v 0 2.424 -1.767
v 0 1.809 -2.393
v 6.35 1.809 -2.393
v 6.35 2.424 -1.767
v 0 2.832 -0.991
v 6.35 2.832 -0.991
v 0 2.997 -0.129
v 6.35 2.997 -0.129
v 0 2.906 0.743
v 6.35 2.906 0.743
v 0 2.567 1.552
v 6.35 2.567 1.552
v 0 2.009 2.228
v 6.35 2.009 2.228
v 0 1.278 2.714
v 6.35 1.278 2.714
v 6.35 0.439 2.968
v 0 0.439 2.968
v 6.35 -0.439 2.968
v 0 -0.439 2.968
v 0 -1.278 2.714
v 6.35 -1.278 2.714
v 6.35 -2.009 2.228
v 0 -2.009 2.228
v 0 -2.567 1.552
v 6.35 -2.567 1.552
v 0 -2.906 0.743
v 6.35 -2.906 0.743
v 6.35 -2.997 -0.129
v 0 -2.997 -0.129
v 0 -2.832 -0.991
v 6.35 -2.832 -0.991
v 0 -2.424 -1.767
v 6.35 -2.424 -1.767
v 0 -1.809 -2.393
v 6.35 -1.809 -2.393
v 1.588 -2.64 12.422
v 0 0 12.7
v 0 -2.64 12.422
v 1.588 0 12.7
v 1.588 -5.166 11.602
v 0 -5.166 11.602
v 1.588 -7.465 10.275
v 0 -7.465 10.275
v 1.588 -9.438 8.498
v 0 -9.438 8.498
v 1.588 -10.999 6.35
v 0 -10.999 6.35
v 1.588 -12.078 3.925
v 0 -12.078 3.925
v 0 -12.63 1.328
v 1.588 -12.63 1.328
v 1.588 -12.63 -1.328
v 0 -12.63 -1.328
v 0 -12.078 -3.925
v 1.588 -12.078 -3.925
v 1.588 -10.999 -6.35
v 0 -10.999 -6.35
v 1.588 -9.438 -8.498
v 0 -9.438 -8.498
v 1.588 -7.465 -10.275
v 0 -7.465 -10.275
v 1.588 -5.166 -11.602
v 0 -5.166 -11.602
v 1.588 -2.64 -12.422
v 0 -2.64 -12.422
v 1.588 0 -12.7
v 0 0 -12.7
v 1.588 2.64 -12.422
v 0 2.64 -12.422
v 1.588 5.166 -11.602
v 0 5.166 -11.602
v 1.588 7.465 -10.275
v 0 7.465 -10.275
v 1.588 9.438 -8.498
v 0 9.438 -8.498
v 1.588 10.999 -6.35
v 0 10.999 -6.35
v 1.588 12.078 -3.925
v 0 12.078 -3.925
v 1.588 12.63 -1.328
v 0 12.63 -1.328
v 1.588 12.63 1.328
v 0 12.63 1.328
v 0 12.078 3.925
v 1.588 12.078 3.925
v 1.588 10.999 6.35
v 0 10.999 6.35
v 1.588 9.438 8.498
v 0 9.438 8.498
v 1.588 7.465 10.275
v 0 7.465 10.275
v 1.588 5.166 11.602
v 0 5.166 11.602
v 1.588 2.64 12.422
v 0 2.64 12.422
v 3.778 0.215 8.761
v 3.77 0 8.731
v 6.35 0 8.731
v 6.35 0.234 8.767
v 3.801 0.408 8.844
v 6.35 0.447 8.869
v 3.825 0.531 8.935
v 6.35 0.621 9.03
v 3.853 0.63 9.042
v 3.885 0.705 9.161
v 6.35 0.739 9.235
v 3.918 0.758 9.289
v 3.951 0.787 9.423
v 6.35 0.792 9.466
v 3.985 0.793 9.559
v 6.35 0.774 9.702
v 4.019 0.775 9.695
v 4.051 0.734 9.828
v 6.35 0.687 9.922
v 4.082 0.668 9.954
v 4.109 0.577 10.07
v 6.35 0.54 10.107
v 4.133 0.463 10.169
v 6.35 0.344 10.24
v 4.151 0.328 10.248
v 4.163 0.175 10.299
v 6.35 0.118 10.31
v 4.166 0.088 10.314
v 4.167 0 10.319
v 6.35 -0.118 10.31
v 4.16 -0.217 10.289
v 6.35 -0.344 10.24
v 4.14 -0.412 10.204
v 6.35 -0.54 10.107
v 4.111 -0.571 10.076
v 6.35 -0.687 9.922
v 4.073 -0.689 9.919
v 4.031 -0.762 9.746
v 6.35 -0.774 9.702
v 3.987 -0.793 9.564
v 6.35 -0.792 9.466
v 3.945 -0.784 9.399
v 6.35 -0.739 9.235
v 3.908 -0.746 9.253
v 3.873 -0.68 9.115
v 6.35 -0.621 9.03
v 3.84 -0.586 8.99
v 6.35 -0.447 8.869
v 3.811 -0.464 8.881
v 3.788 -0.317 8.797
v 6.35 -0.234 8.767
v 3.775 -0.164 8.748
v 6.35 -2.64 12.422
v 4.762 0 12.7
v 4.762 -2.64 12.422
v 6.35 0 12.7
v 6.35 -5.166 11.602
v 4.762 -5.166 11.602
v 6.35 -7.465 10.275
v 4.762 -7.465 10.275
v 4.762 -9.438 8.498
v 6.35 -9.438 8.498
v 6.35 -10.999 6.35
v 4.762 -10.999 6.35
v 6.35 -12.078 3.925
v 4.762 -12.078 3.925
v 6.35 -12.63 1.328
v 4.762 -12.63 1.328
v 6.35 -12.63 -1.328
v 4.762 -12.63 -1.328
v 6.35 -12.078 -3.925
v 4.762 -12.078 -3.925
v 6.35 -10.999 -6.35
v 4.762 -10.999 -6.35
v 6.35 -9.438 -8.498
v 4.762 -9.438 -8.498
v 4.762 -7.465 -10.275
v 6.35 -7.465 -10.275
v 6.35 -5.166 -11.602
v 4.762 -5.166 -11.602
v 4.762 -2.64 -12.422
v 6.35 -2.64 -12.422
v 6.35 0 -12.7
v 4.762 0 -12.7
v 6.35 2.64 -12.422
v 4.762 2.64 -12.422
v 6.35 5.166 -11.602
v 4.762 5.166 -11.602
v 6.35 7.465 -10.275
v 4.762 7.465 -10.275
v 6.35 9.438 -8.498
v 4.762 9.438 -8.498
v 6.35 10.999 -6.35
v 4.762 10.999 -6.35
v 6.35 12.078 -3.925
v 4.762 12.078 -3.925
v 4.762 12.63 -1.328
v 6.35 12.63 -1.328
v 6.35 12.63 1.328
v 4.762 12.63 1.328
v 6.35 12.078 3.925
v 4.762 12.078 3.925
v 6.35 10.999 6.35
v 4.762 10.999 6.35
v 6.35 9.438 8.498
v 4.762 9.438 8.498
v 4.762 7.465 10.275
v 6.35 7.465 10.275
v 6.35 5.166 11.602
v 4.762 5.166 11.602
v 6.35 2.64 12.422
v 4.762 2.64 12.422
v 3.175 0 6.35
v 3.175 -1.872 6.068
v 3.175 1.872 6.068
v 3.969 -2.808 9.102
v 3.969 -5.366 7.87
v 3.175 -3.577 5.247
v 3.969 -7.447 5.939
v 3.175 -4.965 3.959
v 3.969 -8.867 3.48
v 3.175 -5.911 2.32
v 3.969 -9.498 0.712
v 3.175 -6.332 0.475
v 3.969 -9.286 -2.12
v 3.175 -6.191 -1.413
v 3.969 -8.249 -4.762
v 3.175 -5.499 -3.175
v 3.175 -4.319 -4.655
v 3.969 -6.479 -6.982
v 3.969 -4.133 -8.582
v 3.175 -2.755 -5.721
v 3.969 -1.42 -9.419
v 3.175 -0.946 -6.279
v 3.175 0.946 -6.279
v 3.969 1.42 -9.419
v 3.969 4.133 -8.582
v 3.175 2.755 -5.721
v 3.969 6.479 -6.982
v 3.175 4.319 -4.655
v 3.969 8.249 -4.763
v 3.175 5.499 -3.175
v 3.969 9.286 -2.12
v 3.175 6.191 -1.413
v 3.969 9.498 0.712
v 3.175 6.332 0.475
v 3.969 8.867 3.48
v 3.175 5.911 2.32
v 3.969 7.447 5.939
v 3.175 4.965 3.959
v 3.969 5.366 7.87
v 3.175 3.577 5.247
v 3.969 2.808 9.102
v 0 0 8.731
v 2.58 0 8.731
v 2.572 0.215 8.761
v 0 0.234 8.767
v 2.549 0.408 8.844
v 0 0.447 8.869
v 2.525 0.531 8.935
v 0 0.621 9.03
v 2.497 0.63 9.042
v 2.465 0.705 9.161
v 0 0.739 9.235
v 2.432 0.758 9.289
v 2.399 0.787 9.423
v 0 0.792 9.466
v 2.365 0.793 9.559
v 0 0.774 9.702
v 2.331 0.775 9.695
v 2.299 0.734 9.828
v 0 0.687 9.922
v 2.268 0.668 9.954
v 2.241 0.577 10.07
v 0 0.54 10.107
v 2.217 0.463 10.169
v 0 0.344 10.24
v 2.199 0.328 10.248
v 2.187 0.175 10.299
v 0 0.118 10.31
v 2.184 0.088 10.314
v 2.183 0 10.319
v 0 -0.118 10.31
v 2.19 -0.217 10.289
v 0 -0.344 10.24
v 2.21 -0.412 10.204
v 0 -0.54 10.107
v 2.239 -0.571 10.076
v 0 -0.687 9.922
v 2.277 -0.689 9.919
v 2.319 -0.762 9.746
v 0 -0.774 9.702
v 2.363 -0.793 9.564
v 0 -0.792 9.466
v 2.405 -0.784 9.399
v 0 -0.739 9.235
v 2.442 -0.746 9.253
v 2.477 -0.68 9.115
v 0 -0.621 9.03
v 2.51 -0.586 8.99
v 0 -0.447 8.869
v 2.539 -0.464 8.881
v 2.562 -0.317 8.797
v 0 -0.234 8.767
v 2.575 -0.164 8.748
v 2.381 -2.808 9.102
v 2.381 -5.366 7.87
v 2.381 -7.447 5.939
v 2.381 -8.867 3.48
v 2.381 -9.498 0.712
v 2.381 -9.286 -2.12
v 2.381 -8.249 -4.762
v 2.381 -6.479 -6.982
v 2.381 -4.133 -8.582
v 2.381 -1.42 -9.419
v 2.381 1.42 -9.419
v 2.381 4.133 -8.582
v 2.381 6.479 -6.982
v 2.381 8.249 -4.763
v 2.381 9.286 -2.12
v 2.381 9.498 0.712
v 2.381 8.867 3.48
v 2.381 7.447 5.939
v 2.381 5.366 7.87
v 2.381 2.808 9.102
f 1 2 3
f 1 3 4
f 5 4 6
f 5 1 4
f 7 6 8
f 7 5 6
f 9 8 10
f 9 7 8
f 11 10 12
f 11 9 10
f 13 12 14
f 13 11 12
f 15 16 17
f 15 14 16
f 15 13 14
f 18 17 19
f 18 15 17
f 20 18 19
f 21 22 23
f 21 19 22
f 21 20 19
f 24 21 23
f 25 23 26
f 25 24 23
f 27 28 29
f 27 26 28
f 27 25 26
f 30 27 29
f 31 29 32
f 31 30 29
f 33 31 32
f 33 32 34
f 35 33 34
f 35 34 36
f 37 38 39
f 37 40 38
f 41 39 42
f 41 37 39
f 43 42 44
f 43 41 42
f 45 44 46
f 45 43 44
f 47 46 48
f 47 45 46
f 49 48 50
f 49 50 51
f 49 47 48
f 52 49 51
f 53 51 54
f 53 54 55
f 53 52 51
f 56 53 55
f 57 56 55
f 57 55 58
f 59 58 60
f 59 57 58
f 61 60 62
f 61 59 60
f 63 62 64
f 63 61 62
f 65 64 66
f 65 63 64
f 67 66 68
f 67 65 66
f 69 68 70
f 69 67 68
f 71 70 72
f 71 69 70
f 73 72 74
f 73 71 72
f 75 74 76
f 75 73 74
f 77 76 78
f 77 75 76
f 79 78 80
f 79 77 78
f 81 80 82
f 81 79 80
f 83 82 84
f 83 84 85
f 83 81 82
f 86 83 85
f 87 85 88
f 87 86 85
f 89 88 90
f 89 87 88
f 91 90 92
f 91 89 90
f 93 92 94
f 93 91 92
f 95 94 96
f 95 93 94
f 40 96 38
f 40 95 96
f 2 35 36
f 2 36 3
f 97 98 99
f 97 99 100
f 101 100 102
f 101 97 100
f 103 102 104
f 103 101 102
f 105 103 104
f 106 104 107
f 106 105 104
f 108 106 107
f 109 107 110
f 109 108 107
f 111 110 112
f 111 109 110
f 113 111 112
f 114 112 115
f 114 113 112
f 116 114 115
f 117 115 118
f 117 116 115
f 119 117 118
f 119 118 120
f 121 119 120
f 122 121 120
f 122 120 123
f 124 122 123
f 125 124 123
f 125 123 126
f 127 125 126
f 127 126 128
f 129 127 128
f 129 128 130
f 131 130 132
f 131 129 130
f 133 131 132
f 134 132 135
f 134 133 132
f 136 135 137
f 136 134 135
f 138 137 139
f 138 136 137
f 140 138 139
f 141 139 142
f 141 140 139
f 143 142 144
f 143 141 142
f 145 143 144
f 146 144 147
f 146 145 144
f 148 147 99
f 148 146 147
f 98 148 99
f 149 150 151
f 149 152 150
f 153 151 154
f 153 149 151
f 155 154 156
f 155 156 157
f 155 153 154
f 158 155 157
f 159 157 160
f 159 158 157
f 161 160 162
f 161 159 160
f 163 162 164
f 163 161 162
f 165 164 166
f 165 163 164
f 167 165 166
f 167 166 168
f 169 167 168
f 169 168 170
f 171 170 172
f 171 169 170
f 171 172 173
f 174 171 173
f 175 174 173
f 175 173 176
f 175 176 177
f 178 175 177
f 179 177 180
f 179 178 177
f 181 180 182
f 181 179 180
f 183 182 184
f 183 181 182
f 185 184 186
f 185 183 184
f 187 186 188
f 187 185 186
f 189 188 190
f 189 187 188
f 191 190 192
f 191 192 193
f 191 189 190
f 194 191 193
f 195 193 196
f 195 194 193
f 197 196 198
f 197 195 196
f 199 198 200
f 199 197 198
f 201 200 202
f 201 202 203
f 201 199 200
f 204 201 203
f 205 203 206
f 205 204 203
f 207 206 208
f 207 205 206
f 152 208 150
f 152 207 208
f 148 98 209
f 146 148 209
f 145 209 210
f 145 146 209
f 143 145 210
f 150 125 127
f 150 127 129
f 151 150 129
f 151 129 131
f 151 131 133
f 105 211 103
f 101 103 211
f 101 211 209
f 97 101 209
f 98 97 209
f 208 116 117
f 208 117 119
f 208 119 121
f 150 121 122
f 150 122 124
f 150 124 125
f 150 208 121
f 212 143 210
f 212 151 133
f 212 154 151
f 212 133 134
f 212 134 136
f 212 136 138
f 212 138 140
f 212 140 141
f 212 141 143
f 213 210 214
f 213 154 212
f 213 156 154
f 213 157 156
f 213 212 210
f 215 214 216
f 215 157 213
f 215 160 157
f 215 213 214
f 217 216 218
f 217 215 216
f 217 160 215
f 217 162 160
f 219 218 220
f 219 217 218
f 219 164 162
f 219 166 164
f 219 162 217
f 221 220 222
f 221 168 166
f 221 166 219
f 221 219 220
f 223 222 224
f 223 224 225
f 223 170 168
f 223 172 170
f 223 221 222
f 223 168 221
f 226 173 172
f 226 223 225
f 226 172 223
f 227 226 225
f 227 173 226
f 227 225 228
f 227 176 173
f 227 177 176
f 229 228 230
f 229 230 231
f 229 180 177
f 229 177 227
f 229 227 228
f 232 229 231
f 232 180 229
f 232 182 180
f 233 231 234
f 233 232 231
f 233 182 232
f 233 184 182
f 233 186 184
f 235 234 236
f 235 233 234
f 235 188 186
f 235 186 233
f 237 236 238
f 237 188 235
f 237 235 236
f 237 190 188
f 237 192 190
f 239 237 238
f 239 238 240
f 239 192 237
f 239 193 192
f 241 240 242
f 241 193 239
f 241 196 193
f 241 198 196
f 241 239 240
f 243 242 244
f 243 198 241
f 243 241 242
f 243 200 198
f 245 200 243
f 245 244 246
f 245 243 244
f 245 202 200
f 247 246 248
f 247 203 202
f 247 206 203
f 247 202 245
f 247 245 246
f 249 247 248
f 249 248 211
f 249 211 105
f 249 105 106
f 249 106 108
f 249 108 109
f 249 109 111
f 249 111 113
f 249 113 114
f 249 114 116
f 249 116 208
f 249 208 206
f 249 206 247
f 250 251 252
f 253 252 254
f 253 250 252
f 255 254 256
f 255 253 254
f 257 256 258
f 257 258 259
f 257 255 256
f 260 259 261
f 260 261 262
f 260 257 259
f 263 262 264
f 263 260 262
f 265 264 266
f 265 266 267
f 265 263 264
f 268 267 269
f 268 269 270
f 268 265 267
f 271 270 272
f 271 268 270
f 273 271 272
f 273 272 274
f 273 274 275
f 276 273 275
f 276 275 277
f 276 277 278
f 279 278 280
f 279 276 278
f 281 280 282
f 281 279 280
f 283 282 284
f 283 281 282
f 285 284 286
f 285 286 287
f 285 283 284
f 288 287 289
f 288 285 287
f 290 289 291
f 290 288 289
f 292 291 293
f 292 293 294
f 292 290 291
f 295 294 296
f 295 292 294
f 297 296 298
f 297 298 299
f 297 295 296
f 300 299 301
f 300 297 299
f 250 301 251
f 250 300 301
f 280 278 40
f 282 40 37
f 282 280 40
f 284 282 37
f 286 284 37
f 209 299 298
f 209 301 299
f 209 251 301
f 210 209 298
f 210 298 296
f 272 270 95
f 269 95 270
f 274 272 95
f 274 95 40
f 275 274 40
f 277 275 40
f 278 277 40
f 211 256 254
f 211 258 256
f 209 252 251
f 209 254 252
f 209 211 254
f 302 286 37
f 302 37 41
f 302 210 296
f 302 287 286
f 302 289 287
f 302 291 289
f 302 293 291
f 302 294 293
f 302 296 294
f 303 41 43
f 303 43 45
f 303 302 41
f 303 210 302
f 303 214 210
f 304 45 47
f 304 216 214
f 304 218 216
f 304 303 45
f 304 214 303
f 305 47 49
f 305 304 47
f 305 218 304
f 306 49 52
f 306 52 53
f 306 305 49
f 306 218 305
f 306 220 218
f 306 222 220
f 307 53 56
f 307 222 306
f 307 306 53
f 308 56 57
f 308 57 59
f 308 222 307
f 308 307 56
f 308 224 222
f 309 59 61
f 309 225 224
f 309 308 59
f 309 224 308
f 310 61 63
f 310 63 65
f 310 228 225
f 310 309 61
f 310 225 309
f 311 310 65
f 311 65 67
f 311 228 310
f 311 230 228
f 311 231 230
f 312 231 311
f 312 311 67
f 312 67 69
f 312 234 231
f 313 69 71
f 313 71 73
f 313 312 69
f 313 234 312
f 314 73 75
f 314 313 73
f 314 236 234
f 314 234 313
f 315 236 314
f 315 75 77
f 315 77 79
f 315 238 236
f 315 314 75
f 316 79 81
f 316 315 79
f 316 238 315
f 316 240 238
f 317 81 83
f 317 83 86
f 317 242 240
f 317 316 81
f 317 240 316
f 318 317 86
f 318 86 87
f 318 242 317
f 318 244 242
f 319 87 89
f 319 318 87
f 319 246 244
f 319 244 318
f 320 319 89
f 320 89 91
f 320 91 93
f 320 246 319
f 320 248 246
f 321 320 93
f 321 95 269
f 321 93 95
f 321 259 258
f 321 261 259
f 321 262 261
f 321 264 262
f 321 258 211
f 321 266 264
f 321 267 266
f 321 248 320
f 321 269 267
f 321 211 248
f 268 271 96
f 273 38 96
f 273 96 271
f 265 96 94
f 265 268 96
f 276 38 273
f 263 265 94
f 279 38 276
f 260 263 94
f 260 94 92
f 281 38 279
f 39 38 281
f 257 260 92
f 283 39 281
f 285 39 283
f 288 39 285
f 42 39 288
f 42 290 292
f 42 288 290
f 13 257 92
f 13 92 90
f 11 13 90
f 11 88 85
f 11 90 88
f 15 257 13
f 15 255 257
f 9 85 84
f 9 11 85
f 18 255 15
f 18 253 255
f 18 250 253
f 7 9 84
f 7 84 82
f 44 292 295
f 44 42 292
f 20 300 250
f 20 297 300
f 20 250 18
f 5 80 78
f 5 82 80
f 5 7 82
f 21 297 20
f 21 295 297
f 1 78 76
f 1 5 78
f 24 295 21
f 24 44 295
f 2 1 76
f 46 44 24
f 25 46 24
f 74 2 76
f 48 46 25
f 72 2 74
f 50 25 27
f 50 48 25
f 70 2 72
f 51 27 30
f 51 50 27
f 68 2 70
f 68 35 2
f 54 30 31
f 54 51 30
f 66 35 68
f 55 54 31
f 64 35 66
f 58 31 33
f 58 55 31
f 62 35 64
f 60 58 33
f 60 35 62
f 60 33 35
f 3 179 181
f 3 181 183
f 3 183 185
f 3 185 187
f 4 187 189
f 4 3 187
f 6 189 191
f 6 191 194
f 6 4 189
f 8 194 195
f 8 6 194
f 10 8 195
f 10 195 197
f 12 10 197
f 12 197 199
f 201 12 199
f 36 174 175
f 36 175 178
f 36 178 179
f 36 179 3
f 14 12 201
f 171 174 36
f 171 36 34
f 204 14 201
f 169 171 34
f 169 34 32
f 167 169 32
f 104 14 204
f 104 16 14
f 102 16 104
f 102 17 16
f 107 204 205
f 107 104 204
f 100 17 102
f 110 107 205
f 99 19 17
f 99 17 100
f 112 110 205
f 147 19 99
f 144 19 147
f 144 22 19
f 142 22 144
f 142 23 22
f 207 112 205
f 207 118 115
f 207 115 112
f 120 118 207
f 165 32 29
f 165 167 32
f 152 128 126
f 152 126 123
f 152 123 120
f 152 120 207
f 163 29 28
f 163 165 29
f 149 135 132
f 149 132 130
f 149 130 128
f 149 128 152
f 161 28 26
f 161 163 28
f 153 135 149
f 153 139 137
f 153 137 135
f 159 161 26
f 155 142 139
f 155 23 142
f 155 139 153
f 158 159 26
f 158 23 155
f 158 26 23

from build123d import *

# Parameters (mm, degrees)
CUT_EXTRUDE1_DEPTH      = 20.05
CUT_EXTRUDE1_DEPTH_BACK = 20.05
CUT_EXTRUDE2_DEPTH      = 20.05
CUT_EXTRUDE2_DEPTH_BACK = 20.05
SKETCH4_R               = 0.79375


with BuildPart() as part:
    # Sketch2 → Revolve1 (revolve)
    with BuildSketch(Plane.XY, mode=Mode.PRIVATE) as revolve1_sk:
        Polygon((0, 0), (0, 12.7), (1.5875, 12.7), (3.175, 6.35), (4.7625, 12.7), (6.35, 12.7), (6.35, 0), align=None)
    revolve(revolve1_sk.sketch.rotate(Axis((0, 0, 0), (1, 0, 0)), 90), axis=Axis((0, 0, 0), (1, 0, 0)))

    # Sketch3 → Cut-Extrude1 (cut, two sides: drawn at the far end of the back side and taken through both)
    with BuildSketch(Plane(origin=(6.35, 0, 0), x_dir=(0, 0, -1), z_dir=(1, 0, 0)).offset(-CUT_EXTRUDE1_DEPTH_BACK)):
        with BuildLine():
            Line((2.392934, -1.80937306), (2.392934, 1.80937306))
            ThreePointArc((2.392934, 1.80937306), (-2.999994, 0), (2.392934, -1.80937306))
        make_face()
    extrude(amount=CUT_EXTRUDE1_DEPTH + CUT_EXTRUDE1_DEPTH_BACK, mode=Mode.SUBTRACT)

    # Sketch4 → Cut-Extrude2 (cut, two sides: drawn at the far end of the back side and taken through both)
    with BuildSketch(Plane(origin=(6.35, 0, 0), x_dir=(0, 0, -1), z_dir=(1, 0, 0)).offset(-CUT_EXTRUDE2_DEPTH_BACK)):
        with Locations((-9.525, 0)):
            Circle(SKETCH4_R)
    extrude(amount=CUT_EXTRUDE2_DEPTH + CUT_EXTRUDE2_DEPTH_BACK, mode=Mode.SUBTRACT)


solid = part.part
